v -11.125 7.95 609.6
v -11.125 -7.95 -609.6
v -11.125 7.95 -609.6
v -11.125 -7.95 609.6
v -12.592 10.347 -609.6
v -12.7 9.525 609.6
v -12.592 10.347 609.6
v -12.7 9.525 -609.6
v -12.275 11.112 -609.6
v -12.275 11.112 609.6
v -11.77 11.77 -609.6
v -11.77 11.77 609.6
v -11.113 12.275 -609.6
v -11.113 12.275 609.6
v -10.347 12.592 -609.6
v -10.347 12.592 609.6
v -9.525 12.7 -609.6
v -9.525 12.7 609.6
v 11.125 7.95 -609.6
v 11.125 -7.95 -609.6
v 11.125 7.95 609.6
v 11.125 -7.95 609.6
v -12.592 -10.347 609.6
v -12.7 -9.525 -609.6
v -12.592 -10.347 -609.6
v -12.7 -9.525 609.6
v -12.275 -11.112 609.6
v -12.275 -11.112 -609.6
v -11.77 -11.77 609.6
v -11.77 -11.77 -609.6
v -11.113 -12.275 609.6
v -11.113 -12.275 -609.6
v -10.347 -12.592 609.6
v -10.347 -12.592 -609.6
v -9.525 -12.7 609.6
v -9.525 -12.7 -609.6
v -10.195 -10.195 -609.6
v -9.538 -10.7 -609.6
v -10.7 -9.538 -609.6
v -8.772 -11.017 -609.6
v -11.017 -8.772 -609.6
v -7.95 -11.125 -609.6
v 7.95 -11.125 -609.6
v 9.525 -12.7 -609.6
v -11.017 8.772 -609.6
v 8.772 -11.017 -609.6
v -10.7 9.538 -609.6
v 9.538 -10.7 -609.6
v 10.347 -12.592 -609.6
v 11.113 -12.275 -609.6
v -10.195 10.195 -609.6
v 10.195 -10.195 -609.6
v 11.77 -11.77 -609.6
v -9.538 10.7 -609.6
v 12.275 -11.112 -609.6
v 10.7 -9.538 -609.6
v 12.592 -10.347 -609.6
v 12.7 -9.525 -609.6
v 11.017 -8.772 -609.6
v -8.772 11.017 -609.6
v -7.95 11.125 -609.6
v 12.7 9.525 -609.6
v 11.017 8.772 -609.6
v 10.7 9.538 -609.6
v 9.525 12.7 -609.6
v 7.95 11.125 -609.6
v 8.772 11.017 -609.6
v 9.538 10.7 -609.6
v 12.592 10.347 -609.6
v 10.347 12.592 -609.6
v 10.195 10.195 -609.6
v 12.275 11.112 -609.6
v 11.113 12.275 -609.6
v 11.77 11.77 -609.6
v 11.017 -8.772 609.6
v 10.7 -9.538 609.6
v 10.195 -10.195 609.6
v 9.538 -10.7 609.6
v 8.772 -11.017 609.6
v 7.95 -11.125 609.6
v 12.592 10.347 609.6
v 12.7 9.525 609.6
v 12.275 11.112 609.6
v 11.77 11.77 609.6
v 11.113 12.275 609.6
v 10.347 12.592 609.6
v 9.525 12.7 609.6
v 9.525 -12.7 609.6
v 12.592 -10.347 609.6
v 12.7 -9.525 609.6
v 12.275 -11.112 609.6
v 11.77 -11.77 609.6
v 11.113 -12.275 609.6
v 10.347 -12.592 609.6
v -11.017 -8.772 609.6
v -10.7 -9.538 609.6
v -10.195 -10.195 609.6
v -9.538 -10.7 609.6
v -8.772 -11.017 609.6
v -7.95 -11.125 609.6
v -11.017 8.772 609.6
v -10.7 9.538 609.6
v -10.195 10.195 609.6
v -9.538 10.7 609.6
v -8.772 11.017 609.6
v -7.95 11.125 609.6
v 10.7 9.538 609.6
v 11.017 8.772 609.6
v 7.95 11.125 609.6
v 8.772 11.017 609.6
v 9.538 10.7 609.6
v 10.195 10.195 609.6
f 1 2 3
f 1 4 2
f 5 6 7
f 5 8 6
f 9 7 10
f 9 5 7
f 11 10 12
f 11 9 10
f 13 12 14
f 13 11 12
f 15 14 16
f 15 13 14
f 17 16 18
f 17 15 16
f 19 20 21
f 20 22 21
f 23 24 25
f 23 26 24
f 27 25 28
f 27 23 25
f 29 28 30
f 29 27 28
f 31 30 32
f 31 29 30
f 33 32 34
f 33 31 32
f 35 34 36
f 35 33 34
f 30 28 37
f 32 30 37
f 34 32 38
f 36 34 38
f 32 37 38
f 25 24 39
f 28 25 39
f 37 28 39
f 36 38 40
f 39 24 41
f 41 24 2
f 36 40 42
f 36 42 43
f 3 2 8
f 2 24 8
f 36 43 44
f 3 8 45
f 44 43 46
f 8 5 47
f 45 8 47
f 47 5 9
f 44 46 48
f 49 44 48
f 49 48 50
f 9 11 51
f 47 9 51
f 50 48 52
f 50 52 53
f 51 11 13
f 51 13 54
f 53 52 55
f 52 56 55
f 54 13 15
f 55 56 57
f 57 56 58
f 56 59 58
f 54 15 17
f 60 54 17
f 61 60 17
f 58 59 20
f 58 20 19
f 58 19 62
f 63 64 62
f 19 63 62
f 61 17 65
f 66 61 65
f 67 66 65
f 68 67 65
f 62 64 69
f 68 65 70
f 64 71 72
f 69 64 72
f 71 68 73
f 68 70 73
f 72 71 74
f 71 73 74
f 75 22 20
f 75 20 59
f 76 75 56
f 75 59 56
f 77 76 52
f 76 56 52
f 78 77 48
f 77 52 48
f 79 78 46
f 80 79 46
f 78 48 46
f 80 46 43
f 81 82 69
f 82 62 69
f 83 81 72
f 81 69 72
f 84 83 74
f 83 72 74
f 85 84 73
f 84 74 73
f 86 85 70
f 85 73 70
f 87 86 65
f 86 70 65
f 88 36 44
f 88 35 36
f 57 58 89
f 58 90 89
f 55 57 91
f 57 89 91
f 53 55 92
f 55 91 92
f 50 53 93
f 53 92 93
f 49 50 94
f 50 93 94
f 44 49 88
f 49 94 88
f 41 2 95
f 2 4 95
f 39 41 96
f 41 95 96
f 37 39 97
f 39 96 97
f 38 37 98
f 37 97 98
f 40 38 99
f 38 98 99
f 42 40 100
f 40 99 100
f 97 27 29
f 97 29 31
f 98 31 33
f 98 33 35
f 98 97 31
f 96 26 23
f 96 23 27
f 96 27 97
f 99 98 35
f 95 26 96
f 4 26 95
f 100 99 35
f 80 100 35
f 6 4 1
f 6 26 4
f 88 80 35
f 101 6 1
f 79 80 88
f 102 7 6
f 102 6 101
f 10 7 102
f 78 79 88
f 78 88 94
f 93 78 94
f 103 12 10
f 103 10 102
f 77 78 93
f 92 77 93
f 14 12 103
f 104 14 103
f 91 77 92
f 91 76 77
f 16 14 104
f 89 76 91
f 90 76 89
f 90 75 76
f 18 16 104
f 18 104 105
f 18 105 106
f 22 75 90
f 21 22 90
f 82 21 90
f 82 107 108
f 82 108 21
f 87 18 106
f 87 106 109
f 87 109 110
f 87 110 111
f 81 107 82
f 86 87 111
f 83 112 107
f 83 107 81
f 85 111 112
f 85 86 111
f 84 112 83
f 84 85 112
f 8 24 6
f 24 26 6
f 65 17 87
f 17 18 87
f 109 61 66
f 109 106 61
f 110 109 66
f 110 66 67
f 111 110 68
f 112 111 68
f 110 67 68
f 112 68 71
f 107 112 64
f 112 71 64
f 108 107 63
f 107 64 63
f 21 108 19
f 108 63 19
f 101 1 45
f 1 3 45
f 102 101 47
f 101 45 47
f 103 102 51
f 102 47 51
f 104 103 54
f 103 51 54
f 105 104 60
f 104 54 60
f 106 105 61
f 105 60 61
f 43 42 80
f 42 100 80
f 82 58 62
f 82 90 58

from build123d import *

# Parameters (mm, degrees)
SKETCH1_W           = 25.4
SKETCH1_H           = 25.4
SKETCH1_W_2         = 22.2504
SKETCH1_H_2         = 22.2504
BOSS_EXTRUDE1_DEPTH = 609.6
FILLET1_R           = 3.175


with BuildPart() as part:
    # Sketch1 → Boss-Extrude1 (new body, symmetric)
    with BuildSketch(Plane.XY):
        Rectangle(SKETCH1_W, SKETCH1_H)
        Rectangle(SKETCH1_W_2, SKETCH1_H_2, mode=Mode.SUBTRACT)
    extrude(amount=BOSS_EXTRUDE1_DEPTH, both=True)

    # Fillet1
    fillet1_edges = [part.edges().sort_by_distance(p)[0] for p in [
        (11.1252, -11.1252, 0),
        (11.1252, 11.1252, 0),
        (-11.1252, 11.1252, 0),
        (-11.1252, -11.1252, 0),
        (12.7, -12.7, 0),
        (-12.7, -12.7, 0),
        (-12.7, 12.7, 0),
        (12.7, 12.7, 0),
    ]]
    fillet(fillet1_edges, radius=FILLET1_R)


solid = part.part
